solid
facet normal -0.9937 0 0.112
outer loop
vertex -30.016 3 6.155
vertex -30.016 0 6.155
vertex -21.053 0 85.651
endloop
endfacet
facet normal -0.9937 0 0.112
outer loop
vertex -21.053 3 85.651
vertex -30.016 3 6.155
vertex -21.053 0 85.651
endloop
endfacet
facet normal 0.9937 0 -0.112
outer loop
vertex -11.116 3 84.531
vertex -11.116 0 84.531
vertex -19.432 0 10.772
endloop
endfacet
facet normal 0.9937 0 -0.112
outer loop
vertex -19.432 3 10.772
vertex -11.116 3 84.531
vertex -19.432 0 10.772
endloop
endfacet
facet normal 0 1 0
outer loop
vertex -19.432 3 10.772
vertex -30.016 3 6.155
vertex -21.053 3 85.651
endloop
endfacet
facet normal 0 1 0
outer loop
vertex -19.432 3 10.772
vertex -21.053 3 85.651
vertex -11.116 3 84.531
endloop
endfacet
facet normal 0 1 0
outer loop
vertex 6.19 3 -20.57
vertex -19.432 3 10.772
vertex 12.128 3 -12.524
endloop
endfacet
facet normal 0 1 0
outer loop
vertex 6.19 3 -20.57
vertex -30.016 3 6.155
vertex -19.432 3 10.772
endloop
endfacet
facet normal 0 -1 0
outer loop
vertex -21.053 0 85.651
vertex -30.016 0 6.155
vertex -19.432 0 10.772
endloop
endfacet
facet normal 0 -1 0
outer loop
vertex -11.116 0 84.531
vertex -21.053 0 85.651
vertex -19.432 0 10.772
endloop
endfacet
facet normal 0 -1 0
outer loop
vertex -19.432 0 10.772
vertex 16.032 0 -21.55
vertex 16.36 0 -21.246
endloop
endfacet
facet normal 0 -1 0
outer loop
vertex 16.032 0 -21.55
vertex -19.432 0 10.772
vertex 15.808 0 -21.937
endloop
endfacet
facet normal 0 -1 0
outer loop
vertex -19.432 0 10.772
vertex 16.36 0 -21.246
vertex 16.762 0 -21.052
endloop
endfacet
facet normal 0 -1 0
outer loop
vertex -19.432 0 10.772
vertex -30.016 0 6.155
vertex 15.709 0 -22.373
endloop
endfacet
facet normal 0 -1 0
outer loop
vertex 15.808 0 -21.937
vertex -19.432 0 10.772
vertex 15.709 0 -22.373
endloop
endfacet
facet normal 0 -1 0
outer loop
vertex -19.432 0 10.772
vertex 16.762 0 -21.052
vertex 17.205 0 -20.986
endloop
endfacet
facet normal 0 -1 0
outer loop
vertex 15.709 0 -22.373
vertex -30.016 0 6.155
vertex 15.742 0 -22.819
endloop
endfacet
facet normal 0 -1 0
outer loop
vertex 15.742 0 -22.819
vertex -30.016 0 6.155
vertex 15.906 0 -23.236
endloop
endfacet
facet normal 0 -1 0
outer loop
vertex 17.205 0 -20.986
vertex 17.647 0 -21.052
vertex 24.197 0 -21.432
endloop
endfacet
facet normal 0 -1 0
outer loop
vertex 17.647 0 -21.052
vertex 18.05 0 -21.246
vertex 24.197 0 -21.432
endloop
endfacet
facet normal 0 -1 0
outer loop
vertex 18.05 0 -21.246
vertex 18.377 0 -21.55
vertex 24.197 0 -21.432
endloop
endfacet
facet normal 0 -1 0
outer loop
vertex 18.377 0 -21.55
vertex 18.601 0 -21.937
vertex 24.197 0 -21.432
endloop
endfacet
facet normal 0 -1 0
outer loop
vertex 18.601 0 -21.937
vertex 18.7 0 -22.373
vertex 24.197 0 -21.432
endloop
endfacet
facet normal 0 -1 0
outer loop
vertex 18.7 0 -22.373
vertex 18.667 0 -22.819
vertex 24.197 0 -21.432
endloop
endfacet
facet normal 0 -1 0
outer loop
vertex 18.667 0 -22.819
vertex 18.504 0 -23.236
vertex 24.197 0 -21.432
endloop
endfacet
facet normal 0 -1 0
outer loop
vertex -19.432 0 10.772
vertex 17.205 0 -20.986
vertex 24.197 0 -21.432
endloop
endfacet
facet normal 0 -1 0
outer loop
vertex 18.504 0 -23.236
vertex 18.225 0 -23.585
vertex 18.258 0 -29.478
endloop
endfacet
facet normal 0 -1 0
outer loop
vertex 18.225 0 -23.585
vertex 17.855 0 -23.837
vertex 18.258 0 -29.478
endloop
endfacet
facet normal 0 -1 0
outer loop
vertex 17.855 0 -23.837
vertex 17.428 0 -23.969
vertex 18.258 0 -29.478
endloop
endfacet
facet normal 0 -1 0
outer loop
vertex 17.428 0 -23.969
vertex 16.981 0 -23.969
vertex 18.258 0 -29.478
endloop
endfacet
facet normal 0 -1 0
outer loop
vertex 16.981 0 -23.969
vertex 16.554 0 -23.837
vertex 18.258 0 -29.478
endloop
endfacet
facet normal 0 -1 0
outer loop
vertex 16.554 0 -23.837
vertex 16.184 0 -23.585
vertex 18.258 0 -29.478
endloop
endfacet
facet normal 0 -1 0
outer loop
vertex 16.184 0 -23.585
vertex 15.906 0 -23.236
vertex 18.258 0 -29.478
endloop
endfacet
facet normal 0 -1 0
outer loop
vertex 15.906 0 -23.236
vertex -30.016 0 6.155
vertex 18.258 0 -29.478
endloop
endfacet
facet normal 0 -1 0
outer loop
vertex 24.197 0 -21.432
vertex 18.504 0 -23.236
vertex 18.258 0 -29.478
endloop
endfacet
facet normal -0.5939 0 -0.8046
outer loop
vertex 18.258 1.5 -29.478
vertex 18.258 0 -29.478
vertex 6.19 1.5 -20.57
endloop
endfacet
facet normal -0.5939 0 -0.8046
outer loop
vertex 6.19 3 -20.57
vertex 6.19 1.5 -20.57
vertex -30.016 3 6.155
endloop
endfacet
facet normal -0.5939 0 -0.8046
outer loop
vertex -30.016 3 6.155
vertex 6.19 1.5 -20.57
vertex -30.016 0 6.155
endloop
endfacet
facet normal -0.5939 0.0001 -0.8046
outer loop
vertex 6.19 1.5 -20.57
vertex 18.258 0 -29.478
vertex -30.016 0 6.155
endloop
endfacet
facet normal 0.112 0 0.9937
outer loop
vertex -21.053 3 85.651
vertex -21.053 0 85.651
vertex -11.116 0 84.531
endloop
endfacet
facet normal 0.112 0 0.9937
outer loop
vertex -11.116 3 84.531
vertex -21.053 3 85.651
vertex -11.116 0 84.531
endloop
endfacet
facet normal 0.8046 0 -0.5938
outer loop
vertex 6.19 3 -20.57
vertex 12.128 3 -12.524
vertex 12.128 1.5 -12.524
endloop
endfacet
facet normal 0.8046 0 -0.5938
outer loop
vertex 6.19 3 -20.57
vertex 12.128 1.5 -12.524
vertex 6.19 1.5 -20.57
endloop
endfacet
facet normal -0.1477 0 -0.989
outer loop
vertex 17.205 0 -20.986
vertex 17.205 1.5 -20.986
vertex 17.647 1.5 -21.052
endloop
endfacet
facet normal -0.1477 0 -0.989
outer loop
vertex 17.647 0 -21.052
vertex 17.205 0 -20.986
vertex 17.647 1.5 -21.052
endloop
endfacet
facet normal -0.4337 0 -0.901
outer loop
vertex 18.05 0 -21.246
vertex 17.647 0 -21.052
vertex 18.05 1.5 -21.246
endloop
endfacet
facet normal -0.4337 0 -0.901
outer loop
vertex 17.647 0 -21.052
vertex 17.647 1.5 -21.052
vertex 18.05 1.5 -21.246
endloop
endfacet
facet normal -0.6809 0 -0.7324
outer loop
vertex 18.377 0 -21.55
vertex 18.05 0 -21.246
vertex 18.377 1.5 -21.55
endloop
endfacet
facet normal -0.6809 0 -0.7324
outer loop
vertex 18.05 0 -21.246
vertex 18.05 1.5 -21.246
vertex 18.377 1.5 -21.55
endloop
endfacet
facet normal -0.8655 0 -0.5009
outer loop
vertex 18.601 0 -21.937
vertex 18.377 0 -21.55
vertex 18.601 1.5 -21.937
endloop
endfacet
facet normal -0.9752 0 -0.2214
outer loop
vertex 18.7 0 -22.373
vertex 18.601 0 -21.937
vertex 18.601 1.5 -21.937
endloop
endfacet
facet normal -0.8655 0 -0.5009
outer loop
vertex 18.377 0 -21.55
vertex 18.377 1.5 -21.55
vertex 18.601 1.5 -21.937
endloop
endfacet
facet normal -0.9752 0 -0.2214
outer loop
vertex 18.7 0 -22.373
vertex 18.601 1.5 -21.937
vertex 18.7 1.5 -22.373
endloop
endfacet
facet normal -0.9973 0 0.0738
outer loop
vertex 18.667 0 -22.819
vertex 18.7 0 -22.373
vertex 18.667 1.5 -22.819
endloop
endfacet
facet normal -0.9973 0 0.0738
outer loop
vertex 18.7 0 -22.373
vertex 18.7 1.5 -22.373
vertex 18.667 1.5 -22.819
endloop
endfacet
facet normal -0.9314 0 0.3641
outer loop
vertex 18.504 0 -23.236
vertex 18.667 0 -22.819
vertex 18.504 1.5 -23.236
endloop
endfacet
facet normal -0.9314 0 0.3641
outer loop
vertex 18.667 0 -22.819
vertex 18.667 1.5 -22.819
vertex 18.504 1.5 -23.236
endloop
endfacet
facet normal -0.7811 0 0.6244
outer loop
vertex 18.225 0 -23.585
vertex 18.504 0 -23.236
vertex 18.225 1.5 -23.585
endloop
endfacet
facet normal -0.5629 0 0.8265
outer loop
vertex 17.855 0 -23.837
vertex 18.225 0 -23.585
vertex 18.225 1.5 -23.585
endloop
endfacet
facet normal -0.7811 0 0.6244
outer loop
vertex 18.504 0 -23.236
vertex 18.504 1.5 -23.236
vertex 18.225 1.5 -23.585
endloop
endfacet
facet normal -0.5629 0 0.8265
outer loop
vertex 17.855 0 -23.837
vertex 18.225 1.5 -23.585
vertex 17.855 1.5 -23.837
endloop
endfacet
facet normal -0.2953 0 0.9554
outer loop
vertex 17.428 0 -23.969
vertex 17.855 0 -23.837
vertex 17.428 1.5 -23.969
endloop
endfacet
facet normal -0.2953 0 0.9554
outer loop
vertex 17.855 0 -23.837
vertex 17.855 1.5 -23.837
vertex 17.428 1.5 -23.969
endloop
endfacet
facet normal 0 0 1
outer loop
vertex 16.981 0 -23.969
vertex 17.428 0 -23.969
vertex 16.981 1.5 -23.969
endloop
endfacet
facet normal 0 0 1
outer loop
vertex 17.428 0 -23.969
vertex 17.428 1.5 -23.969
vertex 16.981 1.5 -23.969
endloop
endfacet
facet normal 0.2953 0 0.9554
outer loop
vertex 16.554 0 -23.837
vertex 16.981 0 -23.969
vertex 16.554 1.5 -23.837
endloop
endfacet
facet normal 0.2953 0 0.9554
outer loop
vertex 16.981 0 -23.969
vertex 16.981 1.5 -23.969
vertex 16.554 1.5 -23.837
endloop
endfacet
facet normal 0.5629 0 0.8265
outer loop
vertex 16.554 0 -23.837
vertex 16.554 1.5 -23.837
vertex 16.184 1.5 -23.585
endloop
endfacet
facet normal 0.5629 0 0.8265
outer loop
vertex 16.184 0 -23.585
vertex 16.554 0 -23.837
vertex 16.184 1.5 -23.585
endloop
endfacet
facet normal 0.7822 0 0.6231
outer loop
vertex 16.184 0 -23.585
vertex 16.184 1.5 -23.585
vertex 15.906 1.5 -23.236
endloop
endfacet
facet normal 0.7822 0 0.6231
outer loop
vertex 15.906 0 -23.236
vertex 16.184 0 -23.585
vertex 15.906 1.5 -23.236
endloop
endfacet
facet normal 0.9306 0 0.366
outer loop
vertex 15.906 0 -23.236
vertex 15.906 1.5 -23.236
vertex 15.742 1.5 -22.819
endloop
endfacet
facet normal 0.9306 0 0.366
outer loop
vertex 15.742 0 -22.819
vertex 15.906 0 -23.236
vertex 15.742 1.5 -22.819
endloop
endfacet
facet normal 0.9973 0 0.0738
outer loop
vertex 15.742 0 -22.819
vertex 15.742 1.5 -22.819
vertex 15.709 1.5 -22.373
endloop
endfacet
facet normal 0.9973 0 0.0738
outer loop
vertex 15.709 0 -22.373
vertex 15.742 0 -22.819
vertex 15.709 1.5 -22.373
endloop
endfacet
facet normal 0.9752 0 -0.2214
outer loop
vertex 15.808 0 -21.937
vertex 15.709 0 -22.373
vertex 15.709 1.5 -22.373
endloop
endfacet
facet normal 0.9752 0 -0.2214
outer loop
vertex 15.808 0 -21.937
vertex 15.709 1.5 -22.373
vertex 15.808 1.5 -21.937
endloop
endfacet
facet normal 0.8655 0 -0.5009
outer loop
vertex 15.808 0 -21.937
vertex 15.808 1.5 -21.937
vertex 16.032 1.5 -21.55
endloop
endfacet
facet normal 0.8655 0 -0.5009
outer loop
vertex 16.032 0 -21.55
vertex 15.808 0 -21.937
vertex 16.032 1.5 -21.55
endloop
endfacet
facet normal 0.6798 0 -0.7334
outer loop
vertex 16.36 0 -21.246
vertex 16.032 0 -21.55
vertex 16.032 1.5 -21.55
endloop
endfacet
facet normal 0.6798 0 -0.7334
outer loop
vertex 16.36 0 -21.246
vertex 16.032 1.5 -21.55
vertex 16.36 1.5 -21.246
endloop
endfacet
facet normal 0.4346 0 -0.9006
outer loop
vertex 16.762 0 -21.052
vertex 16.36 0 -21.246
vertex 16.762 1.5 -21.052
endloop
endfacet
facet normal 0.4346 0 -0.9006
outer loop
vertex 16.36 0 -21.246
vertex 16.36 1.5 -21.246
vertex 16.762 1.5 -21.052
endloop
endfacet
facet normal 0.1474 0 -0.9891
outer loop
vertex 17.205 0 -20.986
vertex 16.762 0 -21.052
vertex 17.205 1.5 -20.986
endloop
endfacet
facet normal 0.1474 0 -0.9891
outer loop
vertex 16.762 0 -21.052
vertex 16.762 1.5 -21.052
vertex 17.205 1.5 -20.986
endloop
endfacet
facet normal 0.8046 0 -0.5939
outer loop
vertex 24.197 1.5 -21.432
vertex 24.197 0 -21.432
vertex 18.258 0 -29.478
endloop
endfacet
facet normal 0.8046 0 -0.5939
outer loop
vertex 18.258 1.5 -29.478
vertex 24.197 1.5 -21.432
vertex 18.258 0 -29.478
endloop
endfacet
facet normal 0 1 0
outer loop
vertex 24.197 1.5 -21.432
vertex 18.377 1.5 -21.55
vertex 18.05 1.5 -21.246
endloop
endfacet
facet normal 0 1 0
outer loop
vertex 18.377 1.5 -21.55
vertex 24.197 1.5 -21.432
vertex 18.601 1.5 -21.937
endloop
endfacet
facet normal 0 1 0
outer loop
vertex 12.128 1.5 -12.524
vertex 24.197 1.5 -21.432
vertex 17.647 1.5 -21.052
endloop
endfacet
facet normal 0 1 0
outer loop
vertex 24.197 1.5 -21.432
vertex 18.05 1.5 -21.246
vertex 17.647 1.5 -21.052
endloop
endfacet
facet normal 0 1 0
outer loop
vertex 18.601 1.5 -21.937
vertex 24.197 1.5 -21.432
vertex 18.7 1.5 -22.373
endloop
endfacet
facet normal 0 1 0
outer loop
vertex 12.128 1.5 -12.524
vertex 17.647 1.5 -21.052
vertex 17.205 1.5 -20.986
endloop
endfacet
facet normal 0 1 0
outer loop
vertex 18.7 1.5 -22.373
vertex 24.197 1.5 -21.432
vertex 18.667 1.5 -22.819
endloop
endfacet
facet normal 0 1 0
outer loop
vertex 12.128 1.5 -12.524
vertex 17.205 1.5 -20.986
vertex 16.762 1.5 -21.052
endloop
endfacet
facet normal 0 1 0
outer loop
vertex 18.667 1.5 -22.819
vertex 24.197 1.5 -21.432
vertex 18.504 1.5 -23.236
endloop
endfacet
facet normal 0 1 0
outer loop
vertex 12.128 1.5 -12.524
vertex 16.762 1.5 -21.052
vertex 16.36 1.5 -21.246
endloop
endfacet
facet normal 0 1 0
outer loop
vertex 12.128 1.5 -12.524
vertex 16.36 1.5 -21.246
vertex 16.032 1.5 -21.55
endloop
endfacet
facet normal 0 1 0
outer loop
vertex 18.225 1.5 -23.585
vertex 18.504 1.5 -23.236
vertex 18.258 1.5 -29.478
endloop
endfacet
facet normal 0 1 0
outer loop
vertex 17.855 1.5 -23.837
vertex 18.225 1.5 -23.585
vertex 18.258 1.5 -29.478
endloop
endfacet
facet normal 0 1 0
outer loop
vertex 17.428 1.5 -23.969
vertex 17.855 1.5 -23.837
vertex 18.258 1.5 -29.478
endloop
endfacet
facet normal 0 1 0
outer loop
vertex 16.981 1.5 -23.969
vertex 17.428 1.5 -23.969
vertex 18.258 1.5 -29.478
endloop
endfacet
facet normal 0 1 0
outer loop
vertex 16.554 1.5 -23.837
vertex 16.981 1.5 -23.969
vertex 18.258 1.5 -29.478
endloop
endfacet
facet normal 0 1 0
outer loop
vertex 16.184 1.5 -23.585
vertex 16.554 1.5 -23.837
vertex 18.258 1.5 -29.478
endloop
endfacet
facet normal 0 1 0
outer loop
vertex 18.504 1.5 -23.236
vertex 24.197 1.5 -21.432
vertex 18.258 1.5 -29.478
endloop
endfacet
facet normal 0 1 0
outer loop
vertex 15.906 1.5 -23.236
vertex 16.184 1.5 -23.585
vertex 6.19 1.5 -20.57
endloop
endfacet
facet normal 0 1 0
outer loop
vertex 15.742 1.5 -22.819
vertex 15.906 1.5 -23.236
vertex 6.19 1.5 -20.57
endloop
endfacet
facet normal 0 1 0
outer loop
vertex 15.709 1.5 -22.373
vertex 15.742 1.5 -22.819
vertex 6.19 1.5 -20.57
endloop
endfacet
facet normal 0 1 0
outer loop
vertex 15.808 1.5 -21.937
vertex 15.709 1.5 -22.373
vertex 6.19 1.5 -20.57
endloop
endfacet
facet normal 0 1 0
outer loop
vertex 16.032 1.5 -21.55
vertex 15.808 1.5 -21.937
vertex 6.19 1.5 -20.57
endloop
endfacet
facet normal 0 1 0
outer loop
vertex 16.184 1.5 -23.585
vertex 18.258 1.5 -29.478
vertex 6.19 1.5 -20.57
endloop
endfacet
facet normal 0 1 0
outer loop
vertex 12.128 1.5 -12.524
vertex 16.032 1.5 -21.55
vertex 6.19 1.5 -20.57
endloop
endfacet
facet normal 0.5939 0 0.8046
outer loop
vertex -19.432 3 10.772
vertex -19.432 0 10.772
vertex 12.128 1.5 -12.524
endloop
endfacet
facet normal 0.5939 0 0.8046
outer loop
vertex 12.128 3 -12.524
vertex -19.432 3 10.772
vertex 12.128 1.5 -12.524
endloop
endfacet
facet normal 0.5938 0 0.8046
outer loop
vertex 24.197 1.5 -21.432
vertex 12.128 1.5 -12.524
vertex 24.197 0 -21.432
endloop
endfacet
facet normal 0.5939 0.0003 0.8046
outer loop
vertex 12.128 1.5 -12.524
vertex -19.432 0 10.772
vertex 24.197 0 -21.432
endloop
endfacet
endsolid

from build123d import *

# Parameters (mm, degrees)
BOSS_EXTRUDE1_DEPTH = 3
CUT_EXTRUDE1_DEPTH  = 1.5
SKETCH3_R           = 1.5
CUT_EXTRUDE2_DEPTH  = 1.5


with BuildPart() as part:
    # Sketch1 → Boss-Extrude1 (new body)
    with BuildSketch(Plane(origin=(0, 0, 0), x_dir=(1, 0, 0), z_dir=(0, 1, 0))):
        Polygon((18.257985868, 29.477662881), (-30.015571152, -6.154677663), (-21.053259688, -85.65107364), (-11.116210191, -84.530784707), (-19.431722538, -10.771546932), (24.196709292, 21.432070044), align=None)
    extrude(amount=BOSS_EXTRUDE1_DEPTH)

    # Sketch2 → Cut-Extrude1 (cut)
    with BuildSketch(Plane(origin=(0, 3, 0), x_dir=(1, 0, 0), z_dir=(0, 1, 0))):
        Polygon((18.257985868, 29.477662881), (24.196709292, 21.432070044), (12.128320037, 12.523984908), (6.189596613, 20.569577745), align=None)
    extrude(amount=-CUT_EXTRUDE1_DEPTH, mode=Mode.SUBTRACT)

    # Sketch3 → Cut-Extrude2 (cut)
    with BuildSketch(Plane(origin=(0, 1.5, 0), x_dir=(1, 0, 0), z_dir=(0, 1, 0))):
        with Locations(Location((17.204551161, 22.485504751, 0), (0, 0, 270))):
            Circle(SKETCH3_R)
    extrude(amount=-CUT_EXTRUDE2_DEPTH, mode=Mode.SUBTRACT)


solid = part.part
